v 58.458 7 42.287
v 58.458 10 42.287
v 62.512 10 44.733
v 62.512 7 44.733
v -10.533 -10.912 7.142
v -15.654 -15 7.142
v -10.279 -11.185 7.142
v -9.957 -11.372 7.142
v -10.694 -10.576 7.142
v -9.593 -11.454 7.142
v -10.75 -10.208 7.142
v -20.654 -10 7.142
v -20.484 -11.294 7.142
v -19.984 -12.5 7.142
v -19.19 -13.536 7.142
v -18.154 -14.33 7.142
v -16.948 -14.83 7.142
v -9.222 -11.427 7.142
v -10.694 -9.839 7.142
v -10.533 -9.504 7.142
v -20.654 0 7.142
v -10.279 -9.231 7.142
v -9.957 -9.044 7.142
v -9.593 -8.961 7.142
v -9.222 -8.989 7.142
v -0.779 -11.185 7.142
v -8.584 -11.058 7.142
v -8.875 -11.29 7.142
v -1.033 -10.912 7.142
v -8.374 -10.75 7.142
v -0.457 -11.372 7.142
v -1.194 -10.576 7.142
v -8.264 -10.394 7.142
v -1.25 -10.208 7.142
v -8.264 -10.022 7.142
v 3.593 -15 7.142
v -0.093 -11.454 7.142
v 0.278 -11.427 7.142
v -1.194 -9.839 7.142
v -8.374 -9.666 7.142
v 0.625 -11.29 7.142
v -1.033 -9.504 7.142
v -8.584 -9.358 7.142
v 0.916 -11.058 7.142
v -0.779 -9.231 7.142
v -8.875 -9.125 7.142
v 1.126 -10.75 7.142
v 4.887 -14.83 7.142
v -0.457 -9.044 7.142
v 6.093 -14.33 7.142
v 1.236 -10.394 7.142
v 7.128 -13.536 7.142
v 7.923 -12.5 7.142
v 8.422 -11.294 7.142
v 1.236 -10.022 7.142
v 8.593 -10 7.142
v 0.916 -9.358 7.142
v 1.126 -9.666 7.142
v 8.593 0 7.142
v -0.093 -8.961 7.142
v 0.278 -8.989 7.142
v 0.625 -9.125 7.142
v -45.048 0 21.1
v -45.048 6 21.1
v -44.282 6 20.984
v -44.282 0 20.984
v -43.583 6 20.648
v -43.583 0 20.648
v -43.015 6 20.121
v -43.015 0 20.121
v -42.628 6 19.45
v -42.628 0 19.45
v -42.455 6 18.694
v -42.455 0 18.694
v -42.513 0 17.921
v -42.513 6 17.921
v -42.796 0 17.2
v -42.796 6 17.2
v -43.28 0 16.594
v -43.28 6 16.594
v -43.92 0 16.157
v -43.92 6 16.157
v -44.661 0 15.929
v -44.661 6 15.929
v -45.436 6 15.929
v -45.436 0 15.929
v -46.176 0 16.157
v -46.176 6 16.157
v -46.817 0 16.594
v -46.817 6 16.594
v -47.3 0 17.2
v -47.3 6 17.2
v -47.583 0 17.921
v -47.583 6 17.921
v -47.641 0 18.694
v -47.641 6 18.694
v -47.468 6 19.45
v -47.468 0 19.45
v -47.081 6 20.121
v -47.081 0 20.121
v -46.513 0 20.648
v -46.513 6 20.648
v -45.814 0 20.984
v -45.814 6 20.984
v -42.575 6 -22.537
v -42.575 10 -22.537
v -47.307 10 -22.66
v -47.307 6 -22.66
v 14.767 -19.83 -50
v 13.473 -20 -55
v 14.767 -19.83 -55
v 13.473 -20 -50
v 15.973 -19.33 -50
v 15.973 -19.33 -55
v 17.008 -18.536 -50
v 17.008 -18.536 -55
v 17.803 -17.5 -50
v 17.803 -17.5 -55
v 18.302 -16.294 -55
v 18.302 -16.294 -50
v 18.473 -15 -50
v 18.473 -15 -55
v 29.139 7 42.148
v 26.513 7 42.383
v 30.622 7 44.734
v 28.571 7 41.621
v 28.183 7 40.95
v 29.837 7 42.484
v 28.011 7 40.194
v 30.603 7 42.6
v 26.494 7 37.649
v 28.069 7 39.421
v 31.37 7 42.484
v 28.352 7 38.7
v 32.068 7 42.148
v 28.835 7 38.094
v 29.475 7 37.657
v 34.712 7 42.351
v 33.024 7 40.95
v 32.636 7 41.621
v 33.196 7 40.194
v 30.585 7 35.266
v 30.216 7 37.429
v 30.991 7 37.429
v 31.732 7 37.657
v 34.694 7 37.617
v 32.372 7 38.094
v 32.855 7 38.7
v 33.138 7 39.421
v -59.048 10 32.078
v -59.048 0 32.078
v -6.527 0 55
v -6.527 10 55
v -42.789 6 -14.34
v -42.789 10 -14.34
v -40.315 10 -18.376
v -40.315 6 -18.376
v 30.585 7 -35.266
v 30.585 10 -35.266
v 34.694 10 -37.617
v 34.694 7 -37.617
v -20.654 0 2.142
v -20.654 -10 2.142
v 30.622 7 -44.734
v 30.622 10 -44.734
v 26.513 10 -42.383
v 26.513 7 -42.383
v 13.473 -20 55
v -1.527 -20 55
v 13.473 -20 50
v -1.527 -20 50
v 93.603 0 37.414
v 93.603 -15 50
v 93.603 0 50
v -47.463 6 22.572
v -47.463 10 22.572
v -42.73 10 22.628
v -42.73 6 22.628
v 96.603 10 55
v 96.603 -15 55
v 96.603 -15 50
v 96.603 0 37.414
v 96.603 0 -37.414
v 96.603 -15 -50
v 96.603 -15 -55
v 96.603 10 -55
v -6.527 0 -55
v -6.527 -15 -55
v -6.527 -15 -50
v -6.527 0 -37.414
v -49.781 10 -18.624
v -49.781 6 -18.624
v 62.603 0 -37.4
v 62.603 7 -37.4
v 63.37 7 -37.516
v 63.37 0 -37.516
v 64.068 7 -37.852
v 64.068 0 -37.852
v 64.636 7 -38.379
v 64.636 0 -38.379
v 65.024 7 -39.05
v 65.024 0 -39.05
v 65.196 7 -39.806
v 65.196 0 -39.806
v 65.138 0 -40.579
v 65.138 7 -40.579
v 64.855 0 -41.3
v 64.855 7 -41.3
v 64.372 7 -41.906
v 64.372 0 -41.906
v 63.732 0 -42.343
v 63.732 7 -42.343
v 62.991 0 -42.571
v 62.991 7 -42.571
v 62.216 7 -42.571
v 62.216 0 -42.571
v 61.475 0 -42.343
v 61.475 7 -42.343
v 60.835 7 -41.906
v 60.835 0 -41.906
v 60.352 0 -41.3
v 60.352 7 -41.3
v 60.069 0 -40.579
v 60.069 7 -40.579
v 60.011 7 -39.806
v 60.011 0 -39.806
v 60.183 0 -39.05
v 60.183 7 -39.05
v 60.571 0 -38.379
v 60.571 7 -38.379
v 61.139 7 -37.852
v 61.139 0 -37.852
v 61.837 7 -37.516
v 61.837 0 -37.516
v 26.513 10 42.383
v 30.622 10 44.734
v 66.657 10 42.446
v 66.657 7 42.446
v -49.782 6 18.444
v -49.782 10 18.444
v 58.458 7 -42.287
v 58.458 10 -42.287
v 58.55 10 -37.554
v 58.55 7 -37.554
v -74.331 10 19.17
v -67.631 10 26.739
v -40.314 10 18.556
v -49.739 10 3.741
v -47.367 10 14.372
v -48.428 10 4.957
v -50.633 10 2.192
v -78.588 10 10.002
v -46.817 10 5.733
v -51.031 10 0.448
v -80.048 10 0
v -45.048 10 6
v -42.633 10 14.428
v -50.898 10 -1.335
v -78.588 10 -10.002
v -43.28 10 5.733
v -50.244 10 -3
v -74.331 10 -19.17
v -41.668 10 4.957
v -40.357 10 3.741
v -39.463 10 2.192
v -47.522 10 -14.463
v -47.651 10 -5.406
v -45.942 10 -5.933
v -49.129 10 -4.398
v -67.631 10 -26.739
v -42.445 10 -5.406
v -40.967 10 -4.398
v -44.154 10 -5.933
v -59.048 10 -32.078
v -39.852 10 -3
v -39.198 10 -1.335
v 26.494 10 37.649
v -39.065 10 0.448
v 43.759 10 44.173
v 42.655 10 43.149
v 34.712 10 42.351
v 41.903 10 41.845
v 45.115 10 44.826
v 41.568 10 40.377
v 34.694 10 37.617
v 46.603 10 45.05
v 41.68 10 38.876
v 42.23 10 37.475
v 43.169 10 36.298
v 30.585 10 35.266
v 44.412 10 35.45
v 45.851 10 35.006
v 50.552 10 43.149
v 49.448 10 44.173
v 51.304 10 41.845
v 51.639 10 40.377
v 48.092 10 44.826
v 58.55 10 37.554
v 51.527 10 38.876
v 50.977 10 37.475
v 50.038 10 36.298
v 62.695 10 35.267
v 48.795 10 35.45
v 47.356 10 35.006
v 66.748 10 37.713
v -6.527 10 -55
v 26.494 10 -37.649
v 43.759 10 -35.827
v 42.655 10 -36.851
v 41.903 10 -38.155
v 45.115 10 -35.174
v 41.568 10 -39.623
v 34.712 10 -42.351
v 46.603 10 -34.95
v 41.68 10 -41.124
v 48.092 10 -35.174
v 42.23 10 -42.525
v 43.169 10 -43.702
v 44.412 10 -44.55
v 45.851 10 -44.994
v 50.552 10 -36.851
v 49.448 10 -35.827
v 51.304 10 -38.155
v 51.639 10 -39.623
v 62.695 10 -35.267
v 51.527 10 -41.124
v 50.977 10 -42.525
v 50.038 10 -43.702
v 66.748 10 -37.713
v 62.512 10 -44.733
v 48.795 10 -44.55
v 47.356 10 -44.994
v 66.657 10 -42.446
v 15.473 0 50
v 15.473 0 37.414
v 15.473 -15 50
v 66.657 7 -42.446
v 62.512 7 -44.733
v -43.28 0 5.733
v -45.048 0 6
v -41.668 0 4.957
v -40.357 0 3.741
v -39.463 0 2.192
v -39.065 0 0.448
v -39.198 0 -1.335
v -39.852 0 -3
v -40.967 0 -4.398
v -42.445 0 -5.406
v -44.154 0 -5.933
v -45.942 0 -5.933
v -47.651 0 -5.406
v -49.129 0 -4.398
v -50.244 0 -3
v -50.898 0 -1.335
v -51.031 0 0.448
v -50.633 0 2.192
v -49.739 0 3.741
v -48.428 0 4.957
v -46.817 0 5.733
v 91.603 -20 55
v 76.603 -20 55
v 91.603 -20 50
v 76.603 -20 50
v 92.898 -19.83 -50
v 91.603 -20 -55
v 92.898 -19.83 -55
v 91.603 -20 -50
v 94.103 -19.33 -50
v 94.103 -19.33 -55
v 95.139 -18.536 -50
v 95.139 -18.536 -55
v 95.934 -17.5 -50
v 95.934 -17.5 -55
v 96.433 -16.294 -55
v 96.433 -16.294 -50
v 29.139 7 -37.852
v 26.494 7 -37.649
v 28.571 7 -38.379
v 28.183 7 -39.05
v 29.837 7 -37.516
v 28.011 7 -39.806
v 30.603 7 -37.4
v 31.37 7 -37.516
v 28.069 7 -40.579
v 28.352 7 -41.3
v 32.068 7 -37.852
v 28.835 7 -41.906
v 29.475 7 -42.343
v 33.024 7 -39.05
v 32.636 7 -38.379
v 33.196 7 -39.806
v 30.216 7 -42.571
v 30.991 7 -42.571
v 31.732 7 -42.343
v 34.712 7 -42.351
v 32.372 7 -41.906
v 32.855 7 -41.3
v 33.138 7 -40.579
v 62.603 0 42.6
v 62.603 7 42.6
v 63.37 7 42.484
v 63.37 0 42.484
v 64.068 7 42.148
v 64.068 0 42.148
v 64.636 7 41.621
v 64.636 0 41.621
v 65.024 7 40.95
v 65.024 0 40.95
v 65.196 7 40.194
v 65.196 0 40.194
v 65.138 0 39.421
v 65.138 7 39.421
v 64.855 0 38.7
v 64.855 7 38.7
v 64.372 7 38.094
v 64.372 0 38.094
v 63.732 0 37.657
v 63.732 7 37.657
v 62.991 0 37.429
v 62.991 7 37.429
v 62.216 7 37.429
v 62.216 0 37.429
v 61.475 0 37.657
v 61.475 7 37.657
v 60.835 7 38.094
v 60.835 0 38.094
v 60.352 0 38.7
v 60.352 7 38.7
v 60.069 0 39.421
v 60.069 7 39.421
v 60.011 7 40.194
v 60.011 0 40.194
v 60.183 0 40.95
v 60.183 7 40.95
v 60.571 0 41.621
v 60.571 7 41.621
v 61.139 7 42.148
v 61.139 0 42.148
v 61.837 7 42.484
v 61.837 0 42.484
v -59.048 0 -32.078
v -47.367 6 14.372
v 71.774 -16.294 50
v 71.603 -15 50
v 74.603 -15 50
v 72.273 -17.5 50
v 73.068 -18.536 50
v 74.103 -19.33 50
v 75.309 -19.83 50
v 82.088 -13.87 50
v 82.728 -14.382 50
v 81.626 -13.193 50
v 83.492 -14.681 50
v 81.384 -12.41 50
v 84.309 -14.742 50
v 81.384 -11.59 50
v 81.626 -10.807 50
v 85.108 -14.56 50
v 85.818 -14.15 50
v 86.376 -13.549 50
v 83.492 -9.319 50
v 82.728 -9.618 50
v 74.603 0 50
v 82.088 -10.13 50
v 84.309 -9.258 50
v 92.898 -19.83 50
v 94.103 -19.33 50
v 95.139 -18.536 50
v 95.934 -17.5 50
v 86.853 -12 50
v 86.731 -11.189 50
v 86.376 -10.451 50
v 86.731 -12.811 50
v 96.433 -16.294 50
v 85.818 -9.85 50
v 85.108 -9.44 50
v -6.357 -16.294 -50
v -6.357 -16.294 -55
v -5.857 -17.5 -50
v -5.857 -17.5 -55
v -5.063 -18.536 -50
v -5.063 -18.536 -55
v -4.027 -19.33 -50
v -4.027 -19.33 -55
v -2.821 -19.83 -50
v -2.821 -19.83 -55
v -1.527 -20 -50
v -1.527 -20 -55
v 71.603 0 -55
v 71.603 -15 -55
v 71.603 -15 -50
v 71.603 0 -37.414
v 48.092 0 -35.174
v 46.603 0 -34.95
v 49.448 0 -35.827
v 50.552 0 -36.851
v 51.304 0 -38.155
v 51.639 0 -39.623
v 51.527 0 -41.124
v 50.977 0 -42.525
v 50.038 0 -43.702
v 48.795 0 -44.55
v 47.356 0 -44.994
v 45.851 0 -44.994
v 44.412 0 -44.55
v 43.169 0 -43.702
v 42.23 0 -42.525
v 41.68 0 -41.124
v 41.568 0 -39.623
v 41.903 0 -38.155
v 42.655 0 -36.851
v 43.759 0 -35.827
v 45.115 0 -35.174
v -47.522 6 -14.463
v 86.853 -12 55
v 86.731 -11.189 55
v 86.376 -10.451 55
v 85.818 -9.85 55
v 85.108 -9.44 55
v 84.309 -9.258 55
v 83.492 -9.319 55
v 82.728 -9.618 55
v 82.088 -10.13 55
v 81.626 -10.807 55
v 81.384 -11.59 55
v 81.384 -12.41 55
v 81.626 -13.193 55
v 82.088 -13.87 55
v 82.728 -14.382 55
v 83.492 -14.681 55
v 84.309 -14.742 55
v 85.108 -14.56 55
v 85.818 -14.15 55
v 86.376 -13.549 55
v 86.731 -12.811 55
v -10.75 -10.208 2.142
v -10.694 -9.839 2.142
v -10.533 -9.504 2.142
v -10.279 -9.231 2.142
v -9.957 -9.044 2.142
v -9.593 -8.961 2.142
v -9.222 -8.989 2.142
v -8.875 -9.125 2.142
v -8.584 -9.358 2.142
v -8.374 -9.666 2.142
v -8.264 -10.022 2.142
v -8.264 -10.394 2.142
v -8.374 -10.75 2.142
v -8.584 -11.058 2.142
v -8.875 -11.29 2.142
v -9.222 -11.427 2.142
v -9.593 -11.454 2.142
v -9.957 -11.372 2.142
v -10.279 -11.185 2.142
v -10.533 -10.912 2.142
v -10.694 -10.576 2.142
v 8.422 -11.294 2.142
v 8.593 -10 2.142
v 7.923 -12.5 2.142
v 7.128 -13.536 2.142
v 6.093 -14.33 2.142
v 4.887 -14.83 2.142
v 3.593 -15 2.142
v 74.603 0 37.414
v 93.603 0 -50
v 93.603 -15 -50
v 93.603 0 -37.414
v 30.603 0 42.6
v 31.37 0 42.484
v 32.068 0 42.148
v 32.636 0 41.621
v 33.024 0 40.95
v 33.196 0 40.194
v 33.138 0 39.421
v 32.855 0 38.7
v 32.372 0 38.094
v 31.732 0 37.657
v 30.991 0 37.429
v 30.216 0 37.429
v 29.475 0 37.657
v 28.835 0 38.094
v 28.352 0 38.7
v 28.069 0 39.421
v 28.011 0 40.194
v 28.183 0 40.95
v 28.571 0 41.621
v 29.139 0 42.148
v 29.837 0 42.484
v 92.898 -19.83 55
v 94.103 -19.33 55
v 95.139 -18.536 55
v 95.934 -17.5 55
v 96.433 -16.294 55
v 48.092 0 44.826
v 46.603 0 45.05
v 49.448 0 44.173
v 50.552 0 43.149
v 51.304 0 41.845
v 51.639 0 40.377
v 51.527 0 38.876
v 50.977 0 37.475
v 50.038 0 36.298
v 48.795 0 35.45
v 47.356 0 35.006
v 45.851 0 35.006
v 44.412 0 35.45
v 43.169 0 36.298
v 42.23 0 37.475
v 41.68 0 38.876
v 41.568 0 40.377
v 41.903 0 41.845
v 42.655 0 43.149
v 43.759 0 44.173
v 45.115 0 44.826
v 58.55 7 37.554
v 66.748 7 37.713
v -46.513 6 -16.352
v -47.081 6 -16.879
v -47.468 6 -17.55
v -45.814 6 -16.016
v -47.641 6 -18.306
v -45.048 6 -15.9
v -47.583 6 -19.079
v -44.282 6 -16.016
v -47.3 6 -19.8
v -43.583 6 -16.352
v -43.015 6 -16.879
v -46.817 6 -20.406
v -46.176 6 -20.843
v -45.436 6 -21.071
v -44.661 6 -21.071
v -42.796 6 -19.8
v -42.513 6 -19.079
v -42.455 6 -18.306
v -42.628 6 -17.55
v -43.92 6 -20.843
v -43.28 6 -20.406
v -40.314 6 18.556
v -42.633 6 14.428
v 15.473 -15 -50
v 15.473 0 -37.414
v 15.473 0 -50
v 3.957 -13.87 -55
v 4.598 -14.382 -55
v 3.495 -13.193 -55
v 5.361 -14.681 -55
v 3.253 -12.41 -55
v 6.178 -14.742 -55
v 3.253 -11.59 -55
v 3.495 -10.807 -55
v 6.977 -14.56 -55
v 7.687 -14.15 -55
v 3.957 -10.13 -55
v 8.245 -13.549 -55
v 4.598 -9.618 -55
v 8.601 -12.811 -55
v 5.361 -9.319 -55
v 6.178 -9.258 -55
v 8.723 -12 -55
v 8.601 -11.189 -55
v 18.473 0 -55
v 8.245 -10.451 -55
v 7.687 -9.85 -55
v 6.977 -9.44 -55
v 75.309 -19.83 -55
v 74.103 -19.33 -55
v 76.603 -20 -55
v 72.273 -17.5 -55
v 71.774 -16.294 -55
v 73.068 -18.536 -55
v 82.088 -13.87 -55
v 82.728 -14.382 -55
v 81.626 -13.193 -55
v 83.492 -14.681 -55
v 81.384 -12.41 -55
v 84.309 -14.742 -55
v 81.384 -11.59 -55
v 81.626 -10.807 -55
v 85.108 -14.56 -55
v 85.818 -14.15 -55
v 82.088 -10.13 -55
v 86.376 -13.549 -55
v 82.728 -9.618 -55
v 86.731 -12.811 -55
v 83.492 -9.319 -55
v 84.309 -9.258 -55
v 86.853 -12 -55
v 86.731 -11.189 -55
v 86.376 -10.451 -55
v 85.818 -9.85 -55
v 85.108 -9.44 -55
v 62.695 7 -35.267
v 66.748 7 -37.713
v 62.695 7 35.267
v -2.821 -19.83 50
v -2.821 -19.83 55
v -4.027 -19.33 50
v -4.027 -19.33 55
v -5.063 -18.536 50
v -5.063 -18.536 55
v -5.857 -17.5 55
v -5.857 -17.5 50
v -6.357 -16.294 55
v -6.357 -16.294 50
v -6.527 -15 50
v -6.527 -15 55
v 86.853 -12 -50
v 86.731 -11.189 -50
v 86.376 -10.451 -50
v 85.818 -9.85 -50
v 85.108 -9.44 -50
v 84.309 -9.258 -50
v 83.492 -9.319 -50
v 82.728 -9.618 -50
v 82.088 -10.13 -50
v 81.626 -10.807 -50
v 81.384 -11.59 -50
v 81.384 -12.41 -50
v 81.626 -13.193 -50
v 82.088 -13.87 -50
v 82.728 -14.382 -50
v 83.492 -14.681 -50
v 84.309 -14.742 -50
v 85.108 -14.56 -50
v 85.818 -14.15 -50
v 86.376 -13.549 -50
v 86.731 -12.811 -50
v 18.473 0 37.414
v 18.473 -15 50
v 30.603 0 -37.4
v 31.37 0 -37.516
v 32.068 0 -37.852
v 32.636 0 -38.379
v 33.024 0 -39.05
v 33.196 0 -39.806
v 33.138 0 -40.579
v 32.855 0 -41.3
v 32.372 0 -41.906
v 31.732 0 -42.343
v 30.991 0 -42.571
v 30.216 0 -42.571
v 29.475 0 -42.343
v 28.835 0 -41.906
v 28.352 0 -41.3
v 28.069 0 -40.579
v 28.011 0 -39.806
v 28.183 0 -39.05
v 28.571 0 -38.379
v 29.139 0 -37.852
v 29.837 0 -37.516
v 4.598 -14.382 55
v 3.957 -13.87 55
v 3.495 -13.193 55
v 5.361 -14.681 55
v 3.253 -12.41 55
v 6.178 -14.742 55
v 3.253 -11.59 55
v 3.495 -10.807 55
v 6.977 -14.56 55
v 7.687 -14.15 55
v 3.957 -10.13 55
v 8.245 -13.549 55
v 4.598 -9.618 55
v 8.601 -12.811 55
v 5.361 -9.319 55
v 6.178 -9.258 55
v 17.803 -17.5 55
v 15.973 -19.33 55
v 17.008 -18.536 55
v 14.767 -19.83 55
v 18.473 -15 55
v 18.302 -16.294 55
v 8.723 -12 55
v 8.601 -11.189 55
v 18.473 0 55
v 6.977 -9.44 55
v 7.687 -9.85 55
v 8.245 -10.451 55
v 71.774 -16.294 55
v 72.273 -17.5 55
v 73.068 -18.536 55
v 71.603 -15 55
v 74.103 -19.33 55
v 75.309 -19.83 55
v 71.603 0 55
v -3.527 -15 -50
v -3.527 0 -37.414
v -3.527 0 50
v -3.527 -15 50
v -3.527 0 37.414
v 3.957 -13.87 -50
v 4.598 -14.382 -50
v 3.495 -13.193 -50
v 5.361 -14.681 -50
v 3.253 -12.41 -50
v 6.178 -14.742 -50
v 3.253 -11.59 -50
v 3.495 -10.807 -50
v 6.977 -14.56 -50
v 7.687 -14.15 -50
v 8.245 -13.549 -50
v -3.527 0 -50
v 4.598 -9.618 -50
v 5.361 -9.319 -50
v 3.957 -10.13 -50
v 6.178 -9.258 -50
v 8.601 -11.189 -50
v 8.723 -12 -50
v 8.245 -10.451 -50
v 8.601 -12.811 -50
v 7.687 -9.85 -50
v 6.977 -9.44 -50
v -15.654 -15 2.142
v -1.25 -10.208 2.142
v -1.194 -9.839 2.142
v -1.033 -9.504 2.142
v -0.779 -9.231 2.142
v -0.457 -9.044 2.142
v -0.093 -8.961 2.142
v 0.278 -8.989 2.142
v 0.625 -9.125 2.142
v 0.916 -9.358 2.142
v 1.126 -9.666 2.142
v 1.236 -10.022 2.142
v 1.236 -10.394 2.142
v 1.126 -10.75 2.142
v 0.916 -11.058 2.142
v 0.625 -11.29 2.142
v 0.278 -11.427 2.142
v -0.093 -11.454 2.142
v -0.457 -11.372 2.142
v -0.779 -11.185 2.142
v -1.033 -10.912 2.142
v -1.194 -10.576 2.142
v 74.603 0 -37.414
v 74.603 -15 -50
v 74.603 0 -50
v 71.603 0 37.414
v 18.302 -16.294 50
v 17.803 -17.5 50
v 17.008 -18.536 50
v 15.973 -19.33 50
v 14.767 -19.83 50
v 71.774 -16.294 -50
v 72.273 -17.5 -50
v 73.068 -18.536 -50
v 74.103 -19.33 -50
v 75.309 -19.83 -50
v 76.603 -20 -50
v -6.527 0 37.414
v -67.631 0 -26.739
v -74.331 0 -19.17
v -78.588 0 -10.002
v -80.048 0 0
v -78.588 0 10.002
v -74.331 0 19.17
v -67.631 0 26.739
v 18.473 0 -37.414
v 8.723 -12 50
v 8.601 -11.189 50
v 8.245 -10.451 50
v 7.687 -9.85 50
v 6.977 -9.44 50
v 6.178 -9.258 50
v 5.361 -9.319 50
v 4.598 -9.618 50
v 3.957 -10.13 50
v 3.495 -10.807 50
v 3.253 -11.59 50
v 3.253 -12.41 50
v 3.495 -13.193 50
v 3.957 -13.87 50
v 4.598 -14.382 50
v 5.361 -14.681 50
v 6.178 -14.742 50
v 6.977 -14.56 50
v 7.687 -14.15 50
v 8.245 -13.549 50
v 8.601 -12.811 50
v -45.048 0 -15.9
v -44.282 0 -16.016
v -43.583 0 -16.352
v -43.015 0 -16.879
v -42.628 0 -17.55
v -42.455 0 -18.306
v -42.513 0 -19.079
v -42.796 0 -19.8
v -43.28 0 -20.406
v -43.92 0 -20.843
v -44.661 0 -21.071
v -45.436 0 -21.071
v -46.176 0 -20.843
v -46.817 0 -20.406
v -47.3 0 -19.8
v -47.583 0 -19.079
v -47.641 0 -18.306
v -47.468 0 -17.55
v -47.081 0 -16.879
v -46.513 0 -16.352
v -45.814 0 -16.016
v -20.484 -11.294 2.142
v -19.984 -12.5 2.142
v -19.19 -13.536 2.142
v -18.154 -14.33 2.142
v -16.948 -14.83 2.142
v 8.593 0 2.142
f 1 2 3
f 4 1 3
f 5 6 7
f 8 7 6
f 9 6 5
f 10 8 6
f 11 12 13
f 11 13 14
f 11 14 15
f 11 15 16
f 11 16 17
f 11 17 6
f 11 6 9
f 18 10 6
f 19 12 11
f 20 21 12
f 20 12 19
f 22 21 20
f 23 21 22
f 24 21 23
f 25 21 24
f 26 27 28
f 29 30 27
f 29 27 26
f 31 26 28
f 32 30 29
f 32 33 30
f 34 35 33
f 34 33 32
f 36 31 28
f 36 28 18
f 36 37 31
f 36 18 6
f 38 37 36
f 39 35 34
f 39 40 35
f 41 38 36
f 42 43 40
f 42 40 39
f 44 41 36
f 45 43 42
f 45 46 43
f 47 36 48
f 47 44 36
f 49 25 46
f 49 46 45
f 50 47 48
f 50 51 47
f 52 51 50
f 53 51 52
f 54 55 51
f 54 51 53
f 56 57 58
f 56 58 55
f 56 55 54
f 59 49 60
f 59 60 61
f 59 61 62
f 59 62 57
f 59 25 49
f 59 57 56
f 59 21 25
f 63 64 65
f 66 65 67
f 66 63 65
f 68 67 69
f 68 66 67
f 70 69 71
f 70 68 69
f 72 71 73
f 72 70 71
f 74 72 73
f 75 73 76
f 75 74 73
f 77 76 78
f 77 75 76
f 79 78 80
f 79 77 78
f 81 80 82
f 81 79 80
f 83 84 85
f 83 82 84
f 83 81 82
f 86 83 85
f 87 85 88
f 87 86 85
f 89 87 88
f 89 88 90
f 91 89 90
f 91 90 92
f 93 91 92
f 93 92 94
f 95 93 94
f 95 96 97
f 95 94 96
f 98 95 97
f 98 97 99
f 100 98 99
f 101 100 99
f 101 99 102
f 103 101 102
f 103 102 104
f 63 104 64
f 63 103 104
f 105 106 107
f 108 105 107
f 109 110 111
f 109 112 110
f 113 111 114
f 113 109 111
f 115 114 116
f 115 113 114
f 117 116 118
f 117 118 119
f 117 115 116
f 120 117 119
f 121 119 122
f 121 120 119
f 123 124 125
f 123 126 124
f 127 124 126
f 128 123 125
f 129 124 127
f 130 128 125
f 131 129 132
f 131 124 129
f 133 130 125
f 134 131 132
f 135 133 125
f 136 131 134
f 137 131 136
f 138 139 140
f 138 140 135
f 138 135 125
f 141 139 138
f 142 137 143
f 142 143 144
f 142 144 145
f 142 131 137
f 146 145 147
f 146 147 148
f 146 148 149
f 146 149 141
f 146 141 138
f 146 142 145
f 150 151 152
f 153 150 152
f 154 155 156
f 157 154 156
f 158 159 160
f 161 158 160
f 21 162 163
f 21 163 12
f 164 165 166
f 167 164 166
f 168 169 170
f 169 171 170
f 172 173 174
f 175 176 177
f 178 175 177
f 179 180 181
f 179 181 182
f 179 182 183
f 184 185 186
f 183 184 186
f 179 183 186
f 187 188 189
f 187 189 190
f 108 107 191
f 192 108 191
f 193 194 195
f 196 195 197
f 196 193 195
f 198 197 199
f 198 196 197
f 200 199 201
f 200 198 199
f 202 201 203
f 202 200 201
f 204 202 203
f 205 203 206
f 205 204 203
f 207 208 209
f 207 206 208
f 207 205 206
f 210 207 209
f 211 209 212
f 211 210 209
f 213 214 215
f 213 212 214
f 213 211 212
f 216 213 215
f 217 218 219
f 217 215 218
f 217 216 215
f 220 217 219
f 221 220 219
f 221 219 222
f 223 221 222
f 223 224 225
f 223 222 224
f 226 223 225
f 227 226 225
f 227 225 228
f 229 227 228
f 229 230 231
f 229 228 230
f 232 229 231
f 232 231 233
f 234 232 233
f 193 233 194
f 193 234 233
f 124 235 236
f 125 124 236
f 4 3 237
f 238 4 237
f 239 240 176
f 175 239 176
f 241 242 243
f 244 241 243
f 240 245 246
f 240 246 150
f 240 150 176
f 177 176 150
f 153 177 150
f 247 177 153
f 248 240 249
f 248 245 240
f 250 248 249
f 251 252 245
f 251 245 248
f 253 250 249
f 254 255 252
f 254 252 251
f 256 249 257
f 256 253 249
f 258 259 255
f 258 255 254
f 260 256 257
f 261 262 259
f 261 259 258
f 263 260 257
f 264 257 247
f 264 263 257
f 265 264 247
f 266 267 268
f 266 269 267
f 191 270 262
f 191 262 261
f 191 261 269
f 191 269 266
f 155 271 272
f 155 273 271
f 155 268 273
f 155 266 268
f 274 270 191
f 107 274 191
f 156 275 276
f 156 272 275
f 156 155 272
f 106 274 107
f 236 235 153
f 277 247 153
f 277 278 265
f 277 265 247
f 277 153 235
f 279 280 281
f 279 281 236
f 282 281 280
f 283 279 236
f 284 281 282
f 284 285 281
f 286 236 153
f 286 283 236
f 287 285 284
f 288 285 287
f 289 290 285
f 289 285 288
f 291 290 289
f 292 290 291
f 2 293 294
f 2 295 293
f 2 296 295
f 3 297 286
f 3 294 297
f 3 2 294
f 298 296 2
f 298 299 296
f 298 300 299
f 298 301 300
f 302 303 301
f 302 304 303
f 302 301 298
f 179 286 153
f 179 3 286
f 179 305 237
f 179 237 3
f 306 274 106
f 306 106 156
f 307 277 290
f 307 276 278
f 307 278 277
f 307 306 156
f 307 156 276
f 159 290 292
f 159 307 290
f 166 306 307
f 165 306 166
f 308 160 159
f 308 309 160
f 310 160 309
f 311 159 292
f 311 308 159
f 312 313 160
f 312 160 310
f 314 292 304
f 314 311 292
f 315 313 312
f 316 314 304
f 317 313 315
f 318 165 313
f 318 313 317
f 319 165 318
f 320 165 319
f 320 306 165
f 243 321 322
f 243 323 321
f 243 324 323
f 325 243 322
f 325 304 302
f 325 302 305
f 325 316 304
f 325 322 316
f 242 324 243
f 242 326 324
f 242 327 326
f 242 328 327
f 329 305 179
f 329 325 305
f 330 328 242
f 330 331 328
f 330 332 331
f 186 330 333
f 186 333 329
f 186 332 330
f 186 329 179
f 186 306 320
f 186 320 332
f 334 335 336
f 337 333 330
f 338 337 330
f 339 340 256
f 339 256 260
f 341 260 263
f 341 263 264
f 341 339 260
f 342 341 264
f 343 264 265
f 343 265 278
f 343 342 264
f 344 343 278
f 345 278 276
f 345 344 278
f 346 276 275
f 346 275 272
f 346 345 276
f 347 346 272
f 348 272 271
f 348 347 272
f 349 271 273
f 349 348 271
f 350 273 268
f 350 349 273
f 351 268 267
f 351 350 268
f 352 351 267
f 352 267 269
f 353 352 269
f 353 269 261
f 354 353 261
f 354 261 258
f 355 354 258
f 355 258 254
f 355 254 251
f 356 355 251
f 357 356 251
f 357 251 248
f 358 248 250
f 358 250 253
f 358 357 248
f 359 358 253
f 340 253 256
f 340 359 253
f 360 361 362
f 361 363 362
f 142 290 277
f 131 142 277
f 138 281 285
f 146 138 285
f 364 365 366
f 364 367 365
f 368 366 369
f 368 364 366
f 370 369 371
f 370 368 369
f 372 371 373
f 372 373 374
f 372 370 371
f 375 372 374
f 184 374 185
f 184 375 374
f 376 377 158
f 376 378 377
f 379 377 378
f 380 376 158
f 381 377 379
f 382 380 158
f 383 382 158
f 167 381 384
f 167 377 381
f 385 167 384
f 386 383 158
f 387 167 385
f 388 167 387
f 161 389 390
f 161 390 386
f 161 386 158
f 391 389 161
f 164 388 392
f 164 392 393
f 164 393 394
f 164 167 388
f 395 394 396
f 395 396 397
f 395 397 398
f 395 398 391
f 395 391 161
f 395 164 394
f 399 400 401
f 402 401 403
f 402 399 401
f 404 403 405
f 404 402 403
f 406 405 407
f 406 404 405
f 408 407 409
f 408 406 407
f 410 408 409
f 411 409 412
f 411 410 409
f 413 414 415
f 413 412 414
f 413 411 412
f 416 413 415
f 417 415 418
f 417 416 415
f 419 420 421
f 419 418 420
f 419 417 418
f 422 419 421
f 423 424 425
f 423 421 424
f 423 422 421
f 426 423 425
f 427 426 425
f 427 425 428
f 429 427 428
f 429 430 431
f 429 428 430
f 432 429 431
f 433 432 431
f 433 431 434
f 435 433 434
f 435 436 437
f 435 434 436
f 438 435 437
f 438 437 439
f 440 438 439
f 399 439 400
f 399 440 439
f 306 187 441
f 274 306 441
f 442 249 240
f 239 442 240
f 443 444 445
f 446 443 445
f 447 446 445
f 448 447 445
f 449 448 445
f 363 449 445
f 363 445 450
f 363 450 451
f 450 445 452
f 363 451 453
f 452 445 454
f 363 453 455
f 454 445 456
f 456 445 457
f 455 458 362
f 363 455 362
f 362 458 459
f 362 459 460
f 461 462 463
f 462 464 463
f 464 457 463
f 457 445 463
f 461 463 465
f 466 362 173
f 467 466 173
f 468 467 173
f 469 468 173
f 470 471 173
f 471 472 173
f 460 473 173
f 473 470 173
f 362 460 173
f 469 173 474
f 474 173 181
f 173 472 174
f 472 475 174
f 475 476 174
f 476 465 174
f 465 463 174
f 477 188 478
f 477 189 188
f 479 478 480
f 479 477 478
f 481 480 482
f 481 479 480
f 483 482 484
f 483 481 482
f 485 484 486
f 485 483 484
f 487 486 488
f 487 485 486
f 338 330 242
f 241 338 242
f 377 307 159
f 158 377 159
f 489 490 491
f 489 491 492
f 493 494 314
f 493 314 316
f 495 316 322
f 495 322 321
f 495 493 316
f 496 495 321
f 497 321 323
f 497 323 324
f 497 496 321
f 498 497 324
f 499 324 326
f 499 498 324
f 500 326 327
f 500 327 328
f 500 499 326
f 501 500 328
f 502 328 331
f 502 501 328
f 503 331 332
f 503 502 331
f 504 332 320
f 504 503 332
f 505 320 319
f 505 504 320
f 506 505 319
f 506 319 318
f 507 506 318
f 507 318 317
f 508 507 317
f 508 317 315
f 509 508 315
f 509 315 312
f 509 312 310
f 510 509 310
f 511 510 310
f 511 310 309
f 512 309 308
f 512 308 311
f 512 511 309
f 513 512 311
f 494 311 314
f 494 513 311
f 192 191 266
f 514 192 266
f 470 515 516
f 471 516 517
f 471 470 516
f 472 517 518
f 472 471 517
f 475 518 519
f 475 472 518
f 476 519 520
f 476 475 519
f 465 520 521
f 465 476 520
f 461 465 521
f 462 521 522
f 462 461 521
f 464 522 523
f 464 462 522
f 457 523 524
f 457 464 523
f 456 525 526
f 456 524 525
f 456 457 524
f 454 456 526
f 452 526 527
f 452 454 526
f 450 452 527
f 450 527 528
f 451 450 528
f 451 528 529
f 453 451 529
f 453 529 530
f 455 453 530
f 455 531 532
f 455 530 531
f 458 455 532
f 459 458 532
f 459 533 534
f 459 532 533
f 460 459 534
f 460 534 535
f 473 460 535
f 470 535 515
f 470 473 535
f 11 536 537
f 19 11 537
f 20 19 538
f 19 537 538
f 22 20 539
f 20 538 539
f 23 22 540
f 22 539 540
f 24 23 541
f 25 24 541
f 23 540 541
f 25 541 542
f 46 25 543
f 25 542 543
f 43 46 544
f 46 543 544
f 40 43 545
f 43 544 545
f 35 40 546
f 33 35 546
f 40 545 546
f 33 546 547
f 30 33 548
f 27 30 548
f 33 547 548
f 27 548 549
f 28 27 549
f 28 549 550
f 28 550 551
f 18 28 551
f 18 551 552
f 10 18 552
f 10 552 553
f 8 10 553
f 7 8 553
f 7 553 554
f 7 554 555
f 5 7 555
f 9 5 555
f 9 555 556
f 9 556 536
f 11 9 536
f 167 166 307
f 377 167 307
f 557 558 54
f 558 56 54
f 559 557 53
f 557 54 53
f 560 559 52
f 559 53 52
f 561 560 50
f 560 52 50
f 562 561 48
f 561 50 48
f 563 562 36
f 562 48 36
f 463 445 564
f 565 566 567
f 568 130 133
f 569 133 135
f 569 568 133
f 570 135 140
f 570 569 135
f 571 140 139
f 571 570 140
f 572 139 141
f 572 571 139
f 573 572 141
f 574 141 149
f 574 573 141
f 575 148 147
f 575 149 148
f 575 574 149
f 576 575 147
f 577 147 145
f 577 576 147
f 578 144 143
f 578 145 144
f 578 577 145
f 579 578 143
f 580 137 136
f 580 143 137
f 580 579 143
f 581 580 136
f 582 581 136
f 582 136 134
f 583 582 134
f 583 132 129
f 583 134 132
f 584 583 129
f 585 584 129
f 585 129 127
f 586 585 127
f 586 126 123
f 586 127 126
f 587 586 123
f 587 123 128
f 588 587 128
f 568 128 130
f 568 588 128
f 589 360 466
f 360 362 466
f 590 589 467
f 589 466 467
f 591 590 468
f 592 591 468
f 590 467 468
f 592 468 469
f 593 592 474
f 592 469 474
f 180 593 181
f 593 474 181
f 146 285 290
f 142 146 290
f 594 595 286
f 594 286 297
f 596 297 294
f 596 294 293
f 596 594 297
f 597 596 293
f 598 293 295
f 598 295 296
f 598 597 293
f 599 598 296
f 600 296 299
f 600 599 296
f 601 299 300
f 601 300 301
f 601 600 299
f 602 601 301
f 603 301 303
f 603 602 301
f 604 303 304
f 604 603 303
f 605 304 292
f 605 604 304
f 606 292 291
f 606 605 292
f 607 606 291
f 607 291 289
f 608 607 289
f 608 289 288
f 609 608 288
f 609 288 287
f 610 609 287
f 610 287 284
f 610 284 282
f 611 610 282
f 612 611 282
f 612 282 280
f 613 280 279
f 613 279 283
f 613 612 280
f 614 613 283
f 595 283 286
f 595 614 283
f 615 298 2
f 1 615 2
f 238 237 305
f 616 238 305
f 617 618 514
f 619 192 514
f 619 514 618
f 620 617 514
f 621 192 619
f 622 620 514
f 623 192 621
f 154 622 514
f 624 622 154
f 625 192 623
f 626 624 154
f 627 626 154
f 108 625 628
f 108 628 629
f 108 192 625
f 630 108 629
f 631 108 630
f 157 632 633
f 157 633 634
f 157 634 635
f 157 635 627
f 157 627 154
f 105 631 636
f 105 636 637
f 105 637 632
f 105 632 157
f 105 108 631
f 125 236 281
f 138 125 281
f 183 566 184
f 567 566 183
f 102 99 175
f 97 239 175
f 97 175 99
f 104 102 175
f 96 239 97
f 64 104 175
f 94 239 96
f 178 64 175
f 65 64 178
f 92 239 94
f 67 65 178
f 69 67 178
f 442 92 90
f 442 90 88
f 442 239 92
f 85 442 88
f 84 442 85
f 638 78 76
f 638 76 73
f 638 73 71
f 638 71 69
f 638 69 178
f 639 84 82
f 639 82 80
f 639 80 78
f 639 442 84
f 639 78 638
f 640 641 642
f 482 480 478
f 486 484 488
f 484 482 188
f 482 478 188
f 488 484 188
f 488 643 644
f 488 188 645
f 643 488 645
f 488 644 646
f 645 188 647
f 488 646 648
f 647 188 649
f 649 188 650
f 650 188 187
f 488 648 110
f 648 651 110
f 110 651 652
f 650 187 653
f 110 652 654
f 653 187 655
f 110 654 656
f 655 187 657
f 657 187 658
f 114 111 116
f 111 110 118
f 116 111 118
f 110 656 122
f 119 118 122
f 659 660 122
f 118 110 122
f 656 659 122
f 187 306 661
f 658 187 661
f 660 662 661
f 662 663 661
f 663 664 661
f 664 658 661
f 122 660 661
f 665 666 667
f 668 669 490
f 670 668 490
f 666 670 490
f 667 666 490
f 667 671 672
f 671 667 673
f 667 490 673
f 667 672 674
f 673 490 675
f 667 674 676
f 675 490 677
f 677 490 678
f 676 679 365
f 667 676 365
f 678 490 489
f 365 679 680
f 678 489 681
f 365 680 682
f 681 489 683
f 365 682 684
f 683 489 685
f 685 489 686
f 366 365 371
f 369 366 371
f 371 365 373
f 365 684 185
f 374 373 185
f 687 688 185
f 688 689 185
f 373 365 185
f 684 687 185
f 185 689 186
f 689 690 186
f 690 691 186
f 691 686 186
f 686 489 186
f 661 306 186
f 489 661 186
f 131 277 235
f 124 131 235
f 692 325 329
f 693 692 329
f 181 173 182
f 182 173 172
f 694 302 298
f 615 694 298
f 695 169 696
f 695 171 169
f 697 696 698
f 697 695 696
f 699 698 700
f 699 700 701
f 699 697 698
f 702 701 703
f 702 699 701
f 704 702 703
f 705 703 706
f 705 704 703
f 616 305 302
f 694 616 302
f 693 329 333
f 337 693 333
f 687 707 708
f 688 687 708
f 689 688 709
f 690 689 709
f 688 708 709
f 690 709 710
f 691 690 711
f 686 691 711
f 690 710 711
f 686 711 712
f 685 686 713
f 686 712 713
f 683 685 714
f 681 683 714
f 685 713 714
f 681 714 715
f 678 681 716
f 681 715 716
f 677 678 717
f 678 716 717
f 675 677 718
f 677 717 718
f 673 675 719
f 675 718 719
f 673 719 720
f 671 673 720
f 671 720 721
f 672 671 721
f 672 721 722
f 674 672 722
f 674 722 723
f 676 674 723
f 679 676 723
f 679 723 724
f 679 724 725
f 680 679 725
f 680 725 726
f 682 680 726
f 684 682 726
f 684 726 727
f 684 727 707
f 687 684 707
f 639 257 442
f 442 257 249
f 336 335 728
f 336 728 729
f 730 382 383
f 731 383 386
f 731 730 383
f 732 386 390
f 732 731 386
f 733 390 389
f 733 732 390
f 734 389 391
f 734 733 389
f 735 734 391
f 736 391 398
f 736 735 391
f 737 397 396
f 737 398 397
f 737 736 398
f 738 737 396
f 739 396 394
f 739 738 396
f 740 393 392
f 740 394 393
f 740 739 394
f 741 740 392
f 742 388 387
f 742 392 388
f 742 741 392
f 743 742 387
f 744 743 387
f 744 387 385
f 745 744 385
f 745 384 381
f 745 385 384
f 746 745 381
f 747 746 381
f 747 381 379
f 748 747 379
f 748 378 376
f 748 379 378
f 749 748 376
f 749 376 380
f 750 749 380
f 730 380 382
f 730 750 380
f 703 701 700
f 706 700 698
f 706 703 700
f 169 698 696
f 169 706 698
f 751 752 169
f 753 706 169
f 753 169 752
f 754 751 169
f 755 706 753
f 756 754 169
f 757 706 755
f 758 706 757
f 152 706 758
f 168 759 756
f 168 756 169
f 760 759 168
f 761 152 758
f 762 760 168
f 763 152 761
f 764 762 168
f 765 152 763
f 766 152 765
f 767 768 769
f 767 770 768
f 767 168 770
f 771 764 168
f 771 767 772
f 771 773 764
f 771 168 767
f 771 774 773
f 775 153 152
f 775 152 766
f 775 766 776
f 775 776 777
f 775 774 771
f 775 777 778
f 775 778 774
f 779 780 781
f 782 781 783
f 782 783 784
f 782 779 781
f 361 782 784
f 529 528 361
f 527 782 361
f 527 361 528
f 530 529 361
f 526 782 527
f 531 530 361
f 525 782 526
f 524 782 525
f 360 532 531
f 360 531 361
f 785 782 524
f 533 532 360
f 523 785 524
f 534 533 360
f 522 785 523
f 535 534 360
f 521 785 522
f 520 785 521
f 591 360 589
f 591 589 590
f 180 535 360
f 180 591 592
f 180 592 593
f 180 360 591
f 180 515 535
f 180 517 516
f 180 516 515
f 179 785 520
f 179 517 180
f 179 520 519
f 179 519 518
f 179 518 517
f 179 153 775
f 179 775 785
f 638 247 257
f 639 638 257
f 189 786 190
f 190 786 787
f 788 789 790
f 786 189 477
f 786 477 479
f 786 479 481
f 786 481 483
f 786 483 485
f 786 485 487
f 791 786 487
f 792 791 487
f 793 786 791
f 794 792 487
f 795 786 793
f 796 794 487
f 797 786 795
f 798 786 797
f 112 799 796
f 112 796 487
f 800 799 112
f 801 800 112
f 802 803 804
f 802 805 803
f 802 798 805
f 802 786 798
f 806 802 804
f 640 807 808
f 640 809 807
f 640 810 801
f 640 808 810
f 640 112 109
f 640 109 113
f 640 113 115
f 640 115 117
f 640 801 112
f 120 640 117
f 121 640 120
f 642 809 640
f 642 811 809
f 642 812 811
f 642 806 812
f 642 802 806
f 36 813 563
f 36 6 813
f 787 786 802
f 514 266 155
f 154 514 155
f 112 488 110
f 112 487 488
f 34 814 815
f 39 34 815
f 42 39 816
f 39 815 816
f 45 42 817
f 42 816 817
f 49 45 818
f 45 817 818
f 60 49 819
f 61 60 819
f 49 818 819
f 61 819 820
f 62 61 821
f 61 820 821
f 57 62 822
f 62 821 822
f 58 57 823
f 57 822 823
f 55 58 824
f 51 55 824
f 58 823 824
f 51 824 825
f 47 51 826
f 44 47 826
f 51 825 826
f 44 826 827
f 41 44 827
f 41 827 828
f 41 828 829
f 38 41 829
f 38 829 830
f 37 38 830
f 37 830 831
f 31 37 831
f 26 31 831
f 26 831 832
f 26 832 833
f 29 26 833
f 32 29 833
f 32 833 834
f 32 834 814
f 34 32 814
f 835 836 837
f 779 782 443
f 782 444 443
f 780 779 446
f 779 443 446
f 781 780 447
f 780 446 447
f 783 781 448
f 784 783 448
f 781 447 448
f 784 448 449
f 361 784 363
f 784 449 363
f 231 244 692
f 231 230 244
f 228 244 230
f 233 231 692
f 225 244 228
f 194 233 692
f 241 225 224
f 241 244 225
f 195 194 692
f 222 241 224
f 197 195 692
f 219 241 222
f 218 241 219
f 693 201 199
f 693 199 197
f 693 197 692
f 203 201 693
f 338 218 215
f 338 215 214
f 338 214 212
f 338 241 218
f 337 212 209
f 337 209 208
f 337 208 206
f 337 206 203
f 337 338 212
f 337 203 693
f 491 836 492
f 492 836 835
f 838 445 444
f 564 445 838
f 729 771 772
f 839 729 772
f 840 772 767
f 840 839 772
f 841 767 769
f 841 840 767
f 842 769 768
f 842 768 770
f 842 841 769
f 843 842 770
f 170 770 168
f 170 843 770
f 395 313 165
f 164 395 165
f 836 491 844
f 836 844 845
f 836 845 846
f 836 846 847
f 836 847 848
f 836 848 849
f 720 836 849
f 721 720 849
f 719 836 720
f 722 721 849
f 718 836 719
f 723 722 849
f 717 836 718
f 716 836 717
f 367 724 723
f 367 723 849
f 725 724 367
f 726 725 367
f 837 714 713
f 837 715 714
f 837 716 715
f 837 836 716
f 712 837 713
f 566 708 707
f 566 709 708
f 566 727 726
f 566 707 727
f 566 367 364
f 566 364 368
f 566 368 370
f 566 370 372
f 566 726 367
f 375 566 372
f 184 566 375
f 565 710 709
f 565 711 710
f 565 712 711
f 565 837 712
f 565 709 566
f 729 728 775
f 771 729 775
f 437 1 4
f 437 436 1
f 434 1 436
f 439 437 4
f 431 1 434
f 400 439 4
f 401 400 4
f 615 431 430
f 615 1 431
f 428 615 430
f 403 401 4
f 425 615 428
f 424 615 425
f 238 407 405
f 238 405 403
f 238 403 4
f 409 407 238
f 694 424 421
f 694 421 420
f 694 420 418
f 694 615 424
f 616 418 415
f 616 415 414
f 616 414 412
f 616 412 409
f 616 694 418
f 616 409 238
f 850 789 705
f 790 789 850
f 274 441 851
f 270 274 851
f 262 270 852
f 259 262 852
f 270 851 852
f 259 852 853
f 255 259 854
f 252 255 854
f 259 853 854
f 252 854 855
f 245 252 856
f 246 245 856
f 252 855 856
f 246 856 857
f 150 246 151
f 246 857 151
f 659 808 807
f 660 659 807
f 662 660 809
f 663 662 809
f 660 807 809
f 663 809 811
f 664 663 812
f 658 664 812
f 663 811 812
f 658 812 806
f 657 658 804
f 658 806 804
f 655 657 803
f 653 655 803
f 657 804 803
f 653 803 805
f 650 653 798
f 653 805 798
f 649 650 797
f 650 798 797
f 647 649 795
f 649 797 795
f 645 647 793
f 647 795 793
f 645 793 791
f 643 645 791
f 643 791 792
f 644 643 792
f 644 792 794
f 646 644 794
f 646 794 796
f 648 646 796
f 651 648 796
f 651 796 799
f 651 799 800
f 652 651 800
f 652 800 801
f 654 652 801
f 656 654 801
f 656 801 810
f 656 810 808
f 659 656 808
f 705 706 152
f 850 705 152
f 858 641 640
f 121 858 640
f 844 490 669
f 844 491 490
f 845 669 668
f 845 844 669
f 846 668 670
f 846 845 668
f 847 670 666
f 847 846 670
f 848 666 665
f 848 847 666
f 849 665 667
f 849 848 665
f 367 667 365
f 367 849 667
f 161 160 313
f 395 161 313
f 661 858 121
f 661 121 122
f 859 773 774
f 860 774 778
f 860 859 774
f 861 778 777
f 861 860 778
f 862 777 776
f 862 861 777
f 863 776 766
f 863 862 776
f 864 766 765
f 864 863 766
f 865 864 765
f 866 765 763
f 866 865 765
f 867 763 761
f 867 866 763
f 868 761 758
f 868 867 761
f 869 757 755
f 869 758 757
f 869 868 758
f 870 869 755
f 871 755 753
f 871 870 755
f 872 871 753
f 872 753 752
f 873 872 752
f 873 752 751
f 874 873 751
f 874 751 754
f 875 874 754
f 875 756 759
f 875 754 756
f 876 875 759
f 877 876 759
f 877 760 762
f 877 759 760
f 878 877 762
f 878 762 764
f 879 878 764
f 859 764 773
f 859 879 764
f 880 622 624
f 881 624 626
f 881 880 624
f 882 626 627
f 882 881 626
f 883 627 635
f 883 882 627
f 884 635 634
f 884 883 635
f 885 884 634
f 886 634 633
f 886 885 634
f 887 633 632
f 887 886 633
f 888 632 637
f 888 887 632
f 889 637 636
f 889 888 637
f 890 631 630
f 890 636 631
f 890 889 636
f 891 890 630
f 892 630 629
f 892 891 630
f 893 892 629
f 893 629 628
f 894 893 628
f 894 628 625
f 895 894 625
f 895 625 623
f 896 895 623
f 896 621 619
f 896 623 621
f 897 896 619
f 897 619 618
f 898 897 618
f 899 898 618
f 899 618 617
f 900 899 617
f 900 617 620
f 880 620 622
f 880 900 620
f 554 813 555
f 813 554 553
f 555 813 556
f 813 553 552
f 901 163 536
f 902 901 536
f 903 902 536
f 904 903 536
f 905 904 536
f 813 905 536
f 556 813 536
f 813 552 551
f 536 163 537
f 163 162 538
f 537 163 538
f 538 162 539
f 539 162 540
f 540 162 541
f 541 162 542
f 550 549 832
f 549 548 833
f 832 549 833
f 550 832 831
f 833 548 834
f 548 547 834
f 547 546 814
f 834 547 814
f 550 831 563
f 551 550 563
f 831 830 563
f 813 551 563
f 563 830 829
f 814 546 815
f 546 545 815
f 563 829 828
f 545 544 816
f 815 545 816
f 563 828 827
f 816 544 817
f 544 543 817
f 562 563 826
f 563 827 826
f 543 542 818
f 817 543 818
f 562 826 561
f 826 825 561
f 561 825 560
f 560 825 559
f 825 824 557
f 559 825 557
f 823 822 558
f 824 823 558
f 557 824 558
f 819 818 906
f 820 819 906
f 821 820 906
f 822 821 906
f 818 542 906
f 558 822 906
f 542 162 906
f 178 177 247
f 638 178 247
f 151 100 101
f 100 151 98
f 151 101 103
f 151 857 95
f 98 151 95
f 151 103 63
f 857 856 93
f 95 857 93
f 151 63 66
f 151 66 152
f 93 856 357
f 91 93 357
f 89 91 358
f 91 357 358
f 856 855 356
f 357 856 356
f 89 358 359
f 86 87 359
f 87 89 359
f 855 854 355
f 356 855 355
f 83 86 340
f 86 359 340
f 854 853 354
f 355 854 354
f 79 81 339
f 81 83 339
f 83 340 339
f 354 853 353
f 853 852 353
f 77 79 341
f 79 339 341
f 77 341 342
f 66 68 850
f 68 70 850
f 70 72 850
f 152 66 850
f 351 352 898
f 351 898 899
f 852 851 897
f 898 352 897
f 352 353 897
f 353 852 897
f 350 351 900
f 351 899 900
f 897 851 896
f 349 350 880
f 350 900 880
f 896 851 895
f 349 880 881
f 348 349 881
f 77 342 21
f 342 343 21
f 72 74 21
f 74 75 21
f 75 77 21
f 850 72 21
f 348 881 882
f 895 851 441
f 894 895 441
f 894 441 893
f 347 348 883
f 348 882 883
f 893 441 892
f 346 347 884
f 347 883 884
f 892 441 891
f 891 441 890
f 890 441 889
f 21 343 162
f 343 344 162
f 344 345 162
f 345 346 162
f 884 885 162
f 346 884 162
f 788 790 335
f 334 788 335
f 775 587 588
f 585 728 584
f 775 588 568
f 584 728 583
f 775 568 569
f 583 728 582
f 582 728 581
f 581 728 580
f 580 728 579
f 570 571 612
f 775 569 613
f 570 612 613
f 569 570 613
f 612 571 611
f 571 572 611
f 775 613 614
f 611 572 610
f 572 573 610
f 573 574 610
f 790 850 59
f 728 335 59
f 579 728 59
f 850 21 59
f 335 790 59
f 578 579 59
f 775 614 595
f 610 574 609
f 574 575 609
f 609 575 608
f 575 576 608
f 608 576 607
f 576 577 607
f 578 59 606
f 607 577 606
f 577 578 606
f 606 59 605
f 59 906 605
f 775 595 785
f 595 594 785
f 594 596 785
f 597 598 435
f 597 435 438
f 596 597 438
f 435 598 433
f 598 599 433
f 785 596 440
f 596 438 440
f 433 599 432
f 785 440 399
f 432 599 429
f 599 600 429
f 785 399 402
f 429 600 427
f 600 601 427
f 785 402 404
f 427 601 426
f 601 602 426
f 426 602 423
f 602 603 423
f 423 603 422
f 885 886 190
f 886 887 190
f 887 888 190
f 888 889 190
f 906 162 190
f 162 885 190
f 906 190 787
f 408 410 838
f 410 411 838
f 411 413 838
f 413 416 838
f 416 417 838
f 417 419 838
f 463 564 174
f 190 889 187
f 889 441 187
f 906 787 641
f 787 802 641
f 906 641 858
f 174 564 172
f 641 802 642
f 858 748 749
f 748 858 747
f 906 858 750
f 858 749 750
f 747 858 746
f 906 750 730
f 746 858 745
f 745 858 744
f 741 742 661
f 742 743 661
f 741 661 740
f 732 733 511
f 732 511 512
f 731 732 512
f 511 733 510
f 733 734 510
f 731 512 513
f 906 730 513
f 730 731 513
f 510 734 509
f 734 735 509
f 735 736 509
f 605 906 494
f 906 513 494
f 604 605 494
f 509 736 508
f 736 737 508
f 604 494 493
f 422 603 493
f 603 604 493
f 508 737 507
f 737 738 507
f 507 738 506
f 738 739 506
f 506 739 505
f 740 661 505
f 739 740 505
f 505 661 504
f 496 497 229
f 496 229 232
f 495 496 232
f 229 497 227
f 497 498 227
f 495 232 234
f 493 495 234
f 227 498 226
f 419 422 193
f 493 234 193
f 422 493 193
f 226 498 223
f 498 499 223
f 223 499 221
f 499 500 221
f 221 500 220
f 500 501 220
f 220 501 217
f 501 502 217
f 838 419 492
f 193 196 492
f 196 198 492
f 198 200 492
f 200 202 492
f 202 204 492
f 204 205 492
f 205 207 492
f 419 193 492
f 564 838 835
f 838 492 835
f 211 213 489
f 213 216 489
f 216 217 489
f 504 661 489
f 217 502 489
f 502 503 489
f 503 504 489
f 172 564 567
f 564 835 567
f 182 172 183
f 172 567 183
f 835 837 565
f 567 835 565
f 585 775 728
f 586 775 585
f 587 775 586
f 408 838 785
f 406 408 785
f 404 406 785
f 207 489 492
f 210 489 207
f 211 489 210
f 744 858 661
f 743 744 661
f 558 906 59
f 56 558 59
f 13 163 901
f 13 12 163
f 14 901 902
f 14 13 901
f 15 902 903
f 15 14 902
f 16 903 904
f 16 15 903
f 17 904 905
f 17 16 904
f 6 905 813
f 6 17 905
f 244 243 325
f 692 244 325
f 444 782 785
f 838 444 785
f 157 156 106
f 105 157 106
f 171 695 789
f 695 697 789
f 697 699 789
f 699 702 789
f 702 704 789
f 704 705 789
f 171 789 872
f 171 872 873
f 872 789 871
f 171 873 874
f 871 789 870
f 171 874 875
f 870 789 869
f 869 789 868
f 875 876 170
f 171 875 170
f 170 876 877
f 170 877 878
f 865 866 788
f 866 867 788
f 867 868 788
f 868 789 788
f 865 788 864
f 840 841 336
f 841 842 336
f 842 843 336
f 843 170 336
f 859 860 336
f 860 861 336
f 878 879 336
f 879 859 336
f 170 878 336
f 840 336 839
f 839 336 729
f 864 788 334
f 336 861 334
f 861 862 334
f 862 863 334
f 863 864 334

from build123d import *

# Parameters (mm, degrees)
SKETCH1_R            = 5.05
SKETCH1_R_2          = 6
SKETCH1_R_3          = 2.6
BOSS_EXTRUDE1_DEPTH  = 10
SKETCH3_W            = 25
SKETCH3_H            = 5
BOSS_EXTRUDE3_DEPTH  = 20
FILLET2_R            = 5
SKETCH4_R            = 2.75
CUT_EXTRUDE1_DEPTH   = 20
RIB9_REACH           = 120.579
SKETCH10_WALL_W      = 258.738758418
SKETCH10_WALL_H      = 3
RIB10_REACH          = 116.592
SKETCH11_WALL_W      = 250.765351916
SKETCH11_WALL_H      = 3
SKETCH12_W           = 25
SKETCH12_H           = 5
BOSS_EXTRUDE4_DEPTH  = 20
FILLET3_R            = 5
SKETCH13_R           = 2.75
CUT_EXTRUDE2_DEPTH   = 145.073688744
RIB11_REACH          = 188.093
SKETCH14_WALL_W      = 393.76792997
SKETCH14_WALL_H      = 3
RIB12_REACH          = 164.552
SKETCH15_WALL_W      = 347.125659706
SKETCH15_WALL_H      = 3
FILLET2_OF_MIRROR3_R = 5
FILLET3_OF_MIRROR3_R = 5
SKETCH16_W           = 29.246937375
SKETCH16_H           = 5
BOSS_EXTRUDE5_DEPTH  = 15
FILLET4_R            = 5
CUT_EXTRUDE3_REACH   = 116.006
SKETCH17_R           = 1.25
CUT_EXTRUDE4_DEPTH   = 4
CUT_EXTRUDE5_DEPTH   = 3


with BuildPart() as part:
    # Sketch1 → Boss-Extrude1 (new body)
    with BuildSketch(Plane(origin=(0, 0, 0), x_dir=(1, 0, 0), z_dir=(0, 1, 0))):
        with BuildLine():
            Line((-6.527225889, 55), (-59.0480575, 32.078029865))
            ThreePointArc((-59.0480575, 32.078029865), (-80.0480575, 0), (-59.0480575, -32.078029865))
            Line((-59.0480575, -32.078029865), (-6.527225889, -55))
            Line((-6.527225889, -55), (96.603456399, -55))
            Line((96.603456399, -55), (96.603456399, -40))
            Line((96.603456399, -40), (96.603456399, 55))
            Line((96.603456399, 55), (-6.527225889, 55))
        make_face()
        with Locations((46.603456399, 40)):
            Circle(SKETCH1_R, mode=Mode.SUBTRACT)
        with Locations((46.603456399, -40)):
            Circle(SKETCH1_R, mode=Mode.SUBTRACT)
        with Locations((-45.0480575, 0)):
            Circle(SKETCH1_R_2, mode=Mode.SUBTRACT)
        with Locations((30.603456399, 40)):
            Circle(SKETCH1_R_3, mode=Mode.SUBTRACT)
        with Locations((62.603456399, 40)):
            Circle(SKETCH1_R_3, mode=Mode.SUBTRACT)
        with Locations((30.603456399, -40)):
            Circle(SKETCH1_R_3, mode=Mode.SUBTRACT)
        with Locations((62.603456399, -40)):
            Circle(SKETCH1_R_3, mode=Mode.SUBTRACT)
        with Locations((-45.0480575, 18.5)):
            Circle(SKETCH1_R_3, mode=Mode.SUBTRACT)
        with Locations((-45.0480575, -18.5)):
            Circle(SKETCH1_R_3, mode=Mode.SUBTRACT)
    extrude(amount=BOSS_EXTRUDE1_DEPTH)

    # Sketch3 → Boss-Extrude3 (add)
    with BuildSketch(Plane.XZ):
        with Locations((5.972774111, -52.5)):
            Rectangle(SKETCH3_W, SKETCH3_H)
    boss_extrude3 = extrude(amount=BOSS_EXTRUDE3_DEPTH)

    # Fillet2
    fillet2_edges = [part.edges().sort_by_distance(p)[0] for p in [
        (-6.527225889, -20, -52.5),
        (18.472774111, -20, -52.5),
    ]]
    fillet(fillet2_edges, radius=FILLET2_R)

    # Sketch4 → Cut-Extrude1 (cut)
    with BuildSketch(Plane.XY.offset(-50)):
        with Locations((5.972774111, -12)):
            Circle(SKETCH4_R)
    cut_extrude1 = extrude(amount=-CUT_EXTRUDE1_DEPTH, mode=Mode.SUBTRACT)

    # Sketch10 wall → Rib9 (add, up to next)
    with BuildSketch(Plane(origin=(-6.527225889, -7.5, -43.706752766), x_dir=(0, 0.76604444311, 0.642787609697), z_dir=(0, 0.642787609697, -0.76604444311)), mode=Mode.PRIVATE) as rib9_sk1:
        with Locations((0, 1.5)):
            Rectangle(SKETCH10_WALL_W, SKETCH10_WALL_H)
    rib9_tool1 = extrude(rib9_sk1.sketch, amount=RIB9_REACH, mode=Mode.PRIVATE) - part.part
    rib9 = rib9_tool1.solids().sort_by_distance((-6.527225889, -7.5, -43.706752766))[0]
    add(rib9)

    # Sketch11 wall → Rib10 (add, up to next)
    with BuildSketch(Plane(origin=(18.472774111, -7.5, -43.706752766), x_dir=(0, 0.76604444311, 0.642787609697), z_dir=(0, -0.642787609697, 0.76604444311)), mode=Mode.PRIVATE) as rib10_sk1:
        with Locations((0, 1.5)):
            Rectangle(SKETCH11_WALL_W, SKETCH11_WALL_H)
    rib10_tool1 = extrude(rib10_sk1.sketch, amount=-RIB10_REACH, mode=Mode.PRIVATE) - part.part
    rib10 = rib10_tool1.solids().sort_by_distance((18.472774111, -7.5, -43.706752766))[0]
    add(rib10)

    # Sketch12 → Boss-Extrude4 (add)
    with BuildSketch(Plane.XZ):
        with Locations((84.103456399, -52.5)):
            Rectangle(SKETCH12_W, SKETCH12_H)
    boss_extrude4 = extrude(amount=BOSS_EXTRUDE4_DEPTH)

    # Fillet3
    fillet3_edges = [part.edges().sort_by_distance(p)[0] for p in [
        (96.603456399, -20, -52.5),
        (71.603456399, -20, -52.5),
    ]]
    fillet(fillet3_edges, radius=FILLET3_R)

    # Sketch13 → Cut-Extrude2 (cut, through all)
    with BuildSketch(Plane.XY.offset(-50)):
        with Locations((84.103456399, -12)):
            Circle(SKETCH13_R)
    cut_extrude2 = extrude(amount=-CUT_EXTRUDE2_DEPTH, mode=Mode.SUBTRACT)

    # Sketch14 wall → Rib11 (add, up to next)
    with BuildSketch(Plane(origin=(96.603456399, -7.5, -43.706752766), x_dir=(0, 0.76604444311, 0.642787609697), z_dir=(0, -0.642787609697, 0.76604444311)), mode=Mode.PRIVATE) as rib11_sk1:
        with Locations((0, 1.5)):
            Rectangle(SKETCH14_WALL_W, SKETCH14_WALL_H)
    rib11_tool1 = extrude(rib11_sk1.sketch, amount=-RIB11_REACH, mode=Mode.PRIVATE) - part.part
    rib11 = rib11_tool1.solids().sort_by_distance((96.603456399, -7.5, -43.706752766))[0]
    add(rib11)

    # Sketch15 wall → Rib12 (add, up to next)
    with BuildSketch(Plane(origin=(71.603456399, -7.331327668, -43.565219875), x_dir=(0, 0.766044443114, 0.642787609692), z_dir=(0, 0.642787609692, -0.766044443114)), mode=Mode.PRIVATE) as rib12_sk1:
        with Locations((0, 1.5)):
            Rectangle(SKETCH15_WALL_W, SKETCH15_WALL_H)
    rib12_tool1 = extrude(rib12_sk1.sketch, amount=RIB12_REACH, mode=Mode.PRIVATE) - part.part
    rib12 = rib12_tool1.solids().sort_by_distance((71.603456399, -7.331327668, -43.565219875))[0]
    add(rib12)

    # Mirror3: Boss-Extrude3, Cut-Extrude1, Rib9, Rib10, Boss-Extrude4, Cut-Extrude2, Rib11, Rib12 across plane
    add(boss_extrude3.mirror(Plane.XY))
    add(cut_extrude1.mirror(Plane.XY), mode=Mode.SUBTRACT)
    add(rib9.mirror(Plane.XY))
    add(rib10.mirror(Plane.XY))
    add(boss_extrude4.mirror(Plane.XY))
    add(cut_extrude2.mirror(Plane.XY), mode=Mode.SUBTRACT)
    add(rib11.mirror(Plane.XY))
    add(rib12.mirror(Plane.XY))

    # Fillet2 of Mirror3
    fillet2_of_mirror3_edges = [part.edges().sort_by_distance(p)[0] for p in [
        (-6.527225889, -20, 52.5),
        (18.472774111, -20, 52.5),
    ]]
    fillet(fillet2_of_mirror3_edges, radius=FILLET2_OF_MIRROR3_R)

    # Fillet3 of Mirror3
    fillet3_of_mirror3_edges = [part.edges().sort_by_distance(p)[0] for p in [
        (96.603456399, -20, 52.5),
        (71.603456399, -20, 52.5),
    ]]
    fillet(fillet3_of_mirror3_edges, radius=FILLET3_OF_MIRROR3_R)

    # Sketch16 → Boss-Extrude5 (add)
    with BuildSketch(Plane.XZ):
        with Locations((-6.030626379, 4.641549892)):
            Rectangle(SKETCH16_W, SKETCH16_H)
    extrude(amount=BOSS_EXTRUDE5_DEPTH)

    # Fillet4
    fillet4_edges = [part.edges().sort_by_distance(p)[0] for p in [
        (8.592842309, -15, 4.641549892),
        (-20.654095066, -15, 4.641549892),
    ]]
    fillet(fillet4_edges, radius=FILLET4_R)

    # Sketch17 → Cut-Extrude3 (cut, up to next)
    with BuildSketch(Plane(origin=(0, 0, 2.141549892), x_dir=(-1, 0, 0), z_dir=(0, 0, -1)), mode=Mode.PRIVATE) as cut_extrude3_sk1:
        with Locations((0, -10.207909403)):
            Circle(SKETCH17_R)
    cut_extrude3_tool1 = extrude(cut_extrude3_sk1.sketch, amount=-CUT_EXTRUDE3_REACH, mode=Mode.PRIVATE) & part.part
    # Sketch17 → Cut-Extrude3 (cut, up to next)
    with BuildSketch(Plane(origin=(0, 0, 2.141549892), x_dir=(-1, 0, 0), z_dir=(0, 0, -1)), mode=Mode.PRIVATE) as cut_extrude3_sk2:
        with Locations((9.5, -10.207909403)):
            Circle(SKETCH17_R)
    cut_extrude3_tool2 = extrude(cut_extrude3_sk2.sketch, amount=-CUT_EXTRUDE3_REACH, mode=Mode.PRIVATE) & part.part
    add(cut_extrude3_tool1.solids().sort_by_distance((0, -10.207909, 2.14155))[0], mode=Mode.SUBTRACT)
    add(cut_extrude3_tool2.solids().sort_by_distance((-9.5, -10.207909, 2.14155))[0], mode=Mode.SUBTRACT)

    # Sketch19 → Cut-Extrude4 (cut)
    with BuildSketch(Plane(origin=(0, 10, 0), x_dir=(1, 0, 0), z_dir=(0, 1, 0))):
        Polygon((-42.788929966, 14.33951011), (-40.315403797, 18.37621689), (-42.57453133, 22.536706779), (-47.307185033, 22.66048989), (-49.780711203, 18.62378311), (-47.52158367, 14.463293221), align=None)
        Polygon((-42.729558415, -22.627698551), (-40.314116153, -18.555970169), (-42.632615238, -14.428271618), (-47.366556585, -14.372301449), (-49.781998846, -18.444029831), (-47.463499761, -22.571728382), align=None)
    extrude(amount=-CUT_EXTRUDE4_DEPTH, mode=Mode.SUBTRACT)

    # Sketch20 → Cut-Extrude5 (cut)
    with BuildSketch(Plane(origin=(0, 10, 0), x_dir=(1, 0, 0), z_dir=(0, 1, 0))):
        Polygon((58.549967326, 37.554072841), (62.694946918, 35.266611909), (66.748435991, 37.712539068), (66.656945472, 42.445927159), (62.51196588, 44.733388091), (58.458476807, 42.287460932), align=None)
        Polygon((26.494447933, 37.648536039), (30.585379692, 35.265762304), (34.694388158, 37.617226264), (34.712464865, 42.351463961), (30.621533106, 44.734237696), (26.51252464, 42.382773736), align=None)
        Polygon((58.549967326, -37.554072841), (58.458476807, -42.287460932), (62.51196588, -44.733388091), (66.656945472, -42.445927159), (66.748435991, -37.712539068), (62.694946918, -35.266611909), align=None)
        Polygon((26.494447933, -37.648536039), (26.51252464, -42.382773736), (30.621533106, -44.734237696), (34.712464865, -42.351463961), (34.694388158, -37.617226264), (30.585379692, -35.265762304), align=None)
    extrude(amount=-CUT_EXTRUDE5_DEPTH, mode=Mode.SUBTRACT)


solid = part.part
